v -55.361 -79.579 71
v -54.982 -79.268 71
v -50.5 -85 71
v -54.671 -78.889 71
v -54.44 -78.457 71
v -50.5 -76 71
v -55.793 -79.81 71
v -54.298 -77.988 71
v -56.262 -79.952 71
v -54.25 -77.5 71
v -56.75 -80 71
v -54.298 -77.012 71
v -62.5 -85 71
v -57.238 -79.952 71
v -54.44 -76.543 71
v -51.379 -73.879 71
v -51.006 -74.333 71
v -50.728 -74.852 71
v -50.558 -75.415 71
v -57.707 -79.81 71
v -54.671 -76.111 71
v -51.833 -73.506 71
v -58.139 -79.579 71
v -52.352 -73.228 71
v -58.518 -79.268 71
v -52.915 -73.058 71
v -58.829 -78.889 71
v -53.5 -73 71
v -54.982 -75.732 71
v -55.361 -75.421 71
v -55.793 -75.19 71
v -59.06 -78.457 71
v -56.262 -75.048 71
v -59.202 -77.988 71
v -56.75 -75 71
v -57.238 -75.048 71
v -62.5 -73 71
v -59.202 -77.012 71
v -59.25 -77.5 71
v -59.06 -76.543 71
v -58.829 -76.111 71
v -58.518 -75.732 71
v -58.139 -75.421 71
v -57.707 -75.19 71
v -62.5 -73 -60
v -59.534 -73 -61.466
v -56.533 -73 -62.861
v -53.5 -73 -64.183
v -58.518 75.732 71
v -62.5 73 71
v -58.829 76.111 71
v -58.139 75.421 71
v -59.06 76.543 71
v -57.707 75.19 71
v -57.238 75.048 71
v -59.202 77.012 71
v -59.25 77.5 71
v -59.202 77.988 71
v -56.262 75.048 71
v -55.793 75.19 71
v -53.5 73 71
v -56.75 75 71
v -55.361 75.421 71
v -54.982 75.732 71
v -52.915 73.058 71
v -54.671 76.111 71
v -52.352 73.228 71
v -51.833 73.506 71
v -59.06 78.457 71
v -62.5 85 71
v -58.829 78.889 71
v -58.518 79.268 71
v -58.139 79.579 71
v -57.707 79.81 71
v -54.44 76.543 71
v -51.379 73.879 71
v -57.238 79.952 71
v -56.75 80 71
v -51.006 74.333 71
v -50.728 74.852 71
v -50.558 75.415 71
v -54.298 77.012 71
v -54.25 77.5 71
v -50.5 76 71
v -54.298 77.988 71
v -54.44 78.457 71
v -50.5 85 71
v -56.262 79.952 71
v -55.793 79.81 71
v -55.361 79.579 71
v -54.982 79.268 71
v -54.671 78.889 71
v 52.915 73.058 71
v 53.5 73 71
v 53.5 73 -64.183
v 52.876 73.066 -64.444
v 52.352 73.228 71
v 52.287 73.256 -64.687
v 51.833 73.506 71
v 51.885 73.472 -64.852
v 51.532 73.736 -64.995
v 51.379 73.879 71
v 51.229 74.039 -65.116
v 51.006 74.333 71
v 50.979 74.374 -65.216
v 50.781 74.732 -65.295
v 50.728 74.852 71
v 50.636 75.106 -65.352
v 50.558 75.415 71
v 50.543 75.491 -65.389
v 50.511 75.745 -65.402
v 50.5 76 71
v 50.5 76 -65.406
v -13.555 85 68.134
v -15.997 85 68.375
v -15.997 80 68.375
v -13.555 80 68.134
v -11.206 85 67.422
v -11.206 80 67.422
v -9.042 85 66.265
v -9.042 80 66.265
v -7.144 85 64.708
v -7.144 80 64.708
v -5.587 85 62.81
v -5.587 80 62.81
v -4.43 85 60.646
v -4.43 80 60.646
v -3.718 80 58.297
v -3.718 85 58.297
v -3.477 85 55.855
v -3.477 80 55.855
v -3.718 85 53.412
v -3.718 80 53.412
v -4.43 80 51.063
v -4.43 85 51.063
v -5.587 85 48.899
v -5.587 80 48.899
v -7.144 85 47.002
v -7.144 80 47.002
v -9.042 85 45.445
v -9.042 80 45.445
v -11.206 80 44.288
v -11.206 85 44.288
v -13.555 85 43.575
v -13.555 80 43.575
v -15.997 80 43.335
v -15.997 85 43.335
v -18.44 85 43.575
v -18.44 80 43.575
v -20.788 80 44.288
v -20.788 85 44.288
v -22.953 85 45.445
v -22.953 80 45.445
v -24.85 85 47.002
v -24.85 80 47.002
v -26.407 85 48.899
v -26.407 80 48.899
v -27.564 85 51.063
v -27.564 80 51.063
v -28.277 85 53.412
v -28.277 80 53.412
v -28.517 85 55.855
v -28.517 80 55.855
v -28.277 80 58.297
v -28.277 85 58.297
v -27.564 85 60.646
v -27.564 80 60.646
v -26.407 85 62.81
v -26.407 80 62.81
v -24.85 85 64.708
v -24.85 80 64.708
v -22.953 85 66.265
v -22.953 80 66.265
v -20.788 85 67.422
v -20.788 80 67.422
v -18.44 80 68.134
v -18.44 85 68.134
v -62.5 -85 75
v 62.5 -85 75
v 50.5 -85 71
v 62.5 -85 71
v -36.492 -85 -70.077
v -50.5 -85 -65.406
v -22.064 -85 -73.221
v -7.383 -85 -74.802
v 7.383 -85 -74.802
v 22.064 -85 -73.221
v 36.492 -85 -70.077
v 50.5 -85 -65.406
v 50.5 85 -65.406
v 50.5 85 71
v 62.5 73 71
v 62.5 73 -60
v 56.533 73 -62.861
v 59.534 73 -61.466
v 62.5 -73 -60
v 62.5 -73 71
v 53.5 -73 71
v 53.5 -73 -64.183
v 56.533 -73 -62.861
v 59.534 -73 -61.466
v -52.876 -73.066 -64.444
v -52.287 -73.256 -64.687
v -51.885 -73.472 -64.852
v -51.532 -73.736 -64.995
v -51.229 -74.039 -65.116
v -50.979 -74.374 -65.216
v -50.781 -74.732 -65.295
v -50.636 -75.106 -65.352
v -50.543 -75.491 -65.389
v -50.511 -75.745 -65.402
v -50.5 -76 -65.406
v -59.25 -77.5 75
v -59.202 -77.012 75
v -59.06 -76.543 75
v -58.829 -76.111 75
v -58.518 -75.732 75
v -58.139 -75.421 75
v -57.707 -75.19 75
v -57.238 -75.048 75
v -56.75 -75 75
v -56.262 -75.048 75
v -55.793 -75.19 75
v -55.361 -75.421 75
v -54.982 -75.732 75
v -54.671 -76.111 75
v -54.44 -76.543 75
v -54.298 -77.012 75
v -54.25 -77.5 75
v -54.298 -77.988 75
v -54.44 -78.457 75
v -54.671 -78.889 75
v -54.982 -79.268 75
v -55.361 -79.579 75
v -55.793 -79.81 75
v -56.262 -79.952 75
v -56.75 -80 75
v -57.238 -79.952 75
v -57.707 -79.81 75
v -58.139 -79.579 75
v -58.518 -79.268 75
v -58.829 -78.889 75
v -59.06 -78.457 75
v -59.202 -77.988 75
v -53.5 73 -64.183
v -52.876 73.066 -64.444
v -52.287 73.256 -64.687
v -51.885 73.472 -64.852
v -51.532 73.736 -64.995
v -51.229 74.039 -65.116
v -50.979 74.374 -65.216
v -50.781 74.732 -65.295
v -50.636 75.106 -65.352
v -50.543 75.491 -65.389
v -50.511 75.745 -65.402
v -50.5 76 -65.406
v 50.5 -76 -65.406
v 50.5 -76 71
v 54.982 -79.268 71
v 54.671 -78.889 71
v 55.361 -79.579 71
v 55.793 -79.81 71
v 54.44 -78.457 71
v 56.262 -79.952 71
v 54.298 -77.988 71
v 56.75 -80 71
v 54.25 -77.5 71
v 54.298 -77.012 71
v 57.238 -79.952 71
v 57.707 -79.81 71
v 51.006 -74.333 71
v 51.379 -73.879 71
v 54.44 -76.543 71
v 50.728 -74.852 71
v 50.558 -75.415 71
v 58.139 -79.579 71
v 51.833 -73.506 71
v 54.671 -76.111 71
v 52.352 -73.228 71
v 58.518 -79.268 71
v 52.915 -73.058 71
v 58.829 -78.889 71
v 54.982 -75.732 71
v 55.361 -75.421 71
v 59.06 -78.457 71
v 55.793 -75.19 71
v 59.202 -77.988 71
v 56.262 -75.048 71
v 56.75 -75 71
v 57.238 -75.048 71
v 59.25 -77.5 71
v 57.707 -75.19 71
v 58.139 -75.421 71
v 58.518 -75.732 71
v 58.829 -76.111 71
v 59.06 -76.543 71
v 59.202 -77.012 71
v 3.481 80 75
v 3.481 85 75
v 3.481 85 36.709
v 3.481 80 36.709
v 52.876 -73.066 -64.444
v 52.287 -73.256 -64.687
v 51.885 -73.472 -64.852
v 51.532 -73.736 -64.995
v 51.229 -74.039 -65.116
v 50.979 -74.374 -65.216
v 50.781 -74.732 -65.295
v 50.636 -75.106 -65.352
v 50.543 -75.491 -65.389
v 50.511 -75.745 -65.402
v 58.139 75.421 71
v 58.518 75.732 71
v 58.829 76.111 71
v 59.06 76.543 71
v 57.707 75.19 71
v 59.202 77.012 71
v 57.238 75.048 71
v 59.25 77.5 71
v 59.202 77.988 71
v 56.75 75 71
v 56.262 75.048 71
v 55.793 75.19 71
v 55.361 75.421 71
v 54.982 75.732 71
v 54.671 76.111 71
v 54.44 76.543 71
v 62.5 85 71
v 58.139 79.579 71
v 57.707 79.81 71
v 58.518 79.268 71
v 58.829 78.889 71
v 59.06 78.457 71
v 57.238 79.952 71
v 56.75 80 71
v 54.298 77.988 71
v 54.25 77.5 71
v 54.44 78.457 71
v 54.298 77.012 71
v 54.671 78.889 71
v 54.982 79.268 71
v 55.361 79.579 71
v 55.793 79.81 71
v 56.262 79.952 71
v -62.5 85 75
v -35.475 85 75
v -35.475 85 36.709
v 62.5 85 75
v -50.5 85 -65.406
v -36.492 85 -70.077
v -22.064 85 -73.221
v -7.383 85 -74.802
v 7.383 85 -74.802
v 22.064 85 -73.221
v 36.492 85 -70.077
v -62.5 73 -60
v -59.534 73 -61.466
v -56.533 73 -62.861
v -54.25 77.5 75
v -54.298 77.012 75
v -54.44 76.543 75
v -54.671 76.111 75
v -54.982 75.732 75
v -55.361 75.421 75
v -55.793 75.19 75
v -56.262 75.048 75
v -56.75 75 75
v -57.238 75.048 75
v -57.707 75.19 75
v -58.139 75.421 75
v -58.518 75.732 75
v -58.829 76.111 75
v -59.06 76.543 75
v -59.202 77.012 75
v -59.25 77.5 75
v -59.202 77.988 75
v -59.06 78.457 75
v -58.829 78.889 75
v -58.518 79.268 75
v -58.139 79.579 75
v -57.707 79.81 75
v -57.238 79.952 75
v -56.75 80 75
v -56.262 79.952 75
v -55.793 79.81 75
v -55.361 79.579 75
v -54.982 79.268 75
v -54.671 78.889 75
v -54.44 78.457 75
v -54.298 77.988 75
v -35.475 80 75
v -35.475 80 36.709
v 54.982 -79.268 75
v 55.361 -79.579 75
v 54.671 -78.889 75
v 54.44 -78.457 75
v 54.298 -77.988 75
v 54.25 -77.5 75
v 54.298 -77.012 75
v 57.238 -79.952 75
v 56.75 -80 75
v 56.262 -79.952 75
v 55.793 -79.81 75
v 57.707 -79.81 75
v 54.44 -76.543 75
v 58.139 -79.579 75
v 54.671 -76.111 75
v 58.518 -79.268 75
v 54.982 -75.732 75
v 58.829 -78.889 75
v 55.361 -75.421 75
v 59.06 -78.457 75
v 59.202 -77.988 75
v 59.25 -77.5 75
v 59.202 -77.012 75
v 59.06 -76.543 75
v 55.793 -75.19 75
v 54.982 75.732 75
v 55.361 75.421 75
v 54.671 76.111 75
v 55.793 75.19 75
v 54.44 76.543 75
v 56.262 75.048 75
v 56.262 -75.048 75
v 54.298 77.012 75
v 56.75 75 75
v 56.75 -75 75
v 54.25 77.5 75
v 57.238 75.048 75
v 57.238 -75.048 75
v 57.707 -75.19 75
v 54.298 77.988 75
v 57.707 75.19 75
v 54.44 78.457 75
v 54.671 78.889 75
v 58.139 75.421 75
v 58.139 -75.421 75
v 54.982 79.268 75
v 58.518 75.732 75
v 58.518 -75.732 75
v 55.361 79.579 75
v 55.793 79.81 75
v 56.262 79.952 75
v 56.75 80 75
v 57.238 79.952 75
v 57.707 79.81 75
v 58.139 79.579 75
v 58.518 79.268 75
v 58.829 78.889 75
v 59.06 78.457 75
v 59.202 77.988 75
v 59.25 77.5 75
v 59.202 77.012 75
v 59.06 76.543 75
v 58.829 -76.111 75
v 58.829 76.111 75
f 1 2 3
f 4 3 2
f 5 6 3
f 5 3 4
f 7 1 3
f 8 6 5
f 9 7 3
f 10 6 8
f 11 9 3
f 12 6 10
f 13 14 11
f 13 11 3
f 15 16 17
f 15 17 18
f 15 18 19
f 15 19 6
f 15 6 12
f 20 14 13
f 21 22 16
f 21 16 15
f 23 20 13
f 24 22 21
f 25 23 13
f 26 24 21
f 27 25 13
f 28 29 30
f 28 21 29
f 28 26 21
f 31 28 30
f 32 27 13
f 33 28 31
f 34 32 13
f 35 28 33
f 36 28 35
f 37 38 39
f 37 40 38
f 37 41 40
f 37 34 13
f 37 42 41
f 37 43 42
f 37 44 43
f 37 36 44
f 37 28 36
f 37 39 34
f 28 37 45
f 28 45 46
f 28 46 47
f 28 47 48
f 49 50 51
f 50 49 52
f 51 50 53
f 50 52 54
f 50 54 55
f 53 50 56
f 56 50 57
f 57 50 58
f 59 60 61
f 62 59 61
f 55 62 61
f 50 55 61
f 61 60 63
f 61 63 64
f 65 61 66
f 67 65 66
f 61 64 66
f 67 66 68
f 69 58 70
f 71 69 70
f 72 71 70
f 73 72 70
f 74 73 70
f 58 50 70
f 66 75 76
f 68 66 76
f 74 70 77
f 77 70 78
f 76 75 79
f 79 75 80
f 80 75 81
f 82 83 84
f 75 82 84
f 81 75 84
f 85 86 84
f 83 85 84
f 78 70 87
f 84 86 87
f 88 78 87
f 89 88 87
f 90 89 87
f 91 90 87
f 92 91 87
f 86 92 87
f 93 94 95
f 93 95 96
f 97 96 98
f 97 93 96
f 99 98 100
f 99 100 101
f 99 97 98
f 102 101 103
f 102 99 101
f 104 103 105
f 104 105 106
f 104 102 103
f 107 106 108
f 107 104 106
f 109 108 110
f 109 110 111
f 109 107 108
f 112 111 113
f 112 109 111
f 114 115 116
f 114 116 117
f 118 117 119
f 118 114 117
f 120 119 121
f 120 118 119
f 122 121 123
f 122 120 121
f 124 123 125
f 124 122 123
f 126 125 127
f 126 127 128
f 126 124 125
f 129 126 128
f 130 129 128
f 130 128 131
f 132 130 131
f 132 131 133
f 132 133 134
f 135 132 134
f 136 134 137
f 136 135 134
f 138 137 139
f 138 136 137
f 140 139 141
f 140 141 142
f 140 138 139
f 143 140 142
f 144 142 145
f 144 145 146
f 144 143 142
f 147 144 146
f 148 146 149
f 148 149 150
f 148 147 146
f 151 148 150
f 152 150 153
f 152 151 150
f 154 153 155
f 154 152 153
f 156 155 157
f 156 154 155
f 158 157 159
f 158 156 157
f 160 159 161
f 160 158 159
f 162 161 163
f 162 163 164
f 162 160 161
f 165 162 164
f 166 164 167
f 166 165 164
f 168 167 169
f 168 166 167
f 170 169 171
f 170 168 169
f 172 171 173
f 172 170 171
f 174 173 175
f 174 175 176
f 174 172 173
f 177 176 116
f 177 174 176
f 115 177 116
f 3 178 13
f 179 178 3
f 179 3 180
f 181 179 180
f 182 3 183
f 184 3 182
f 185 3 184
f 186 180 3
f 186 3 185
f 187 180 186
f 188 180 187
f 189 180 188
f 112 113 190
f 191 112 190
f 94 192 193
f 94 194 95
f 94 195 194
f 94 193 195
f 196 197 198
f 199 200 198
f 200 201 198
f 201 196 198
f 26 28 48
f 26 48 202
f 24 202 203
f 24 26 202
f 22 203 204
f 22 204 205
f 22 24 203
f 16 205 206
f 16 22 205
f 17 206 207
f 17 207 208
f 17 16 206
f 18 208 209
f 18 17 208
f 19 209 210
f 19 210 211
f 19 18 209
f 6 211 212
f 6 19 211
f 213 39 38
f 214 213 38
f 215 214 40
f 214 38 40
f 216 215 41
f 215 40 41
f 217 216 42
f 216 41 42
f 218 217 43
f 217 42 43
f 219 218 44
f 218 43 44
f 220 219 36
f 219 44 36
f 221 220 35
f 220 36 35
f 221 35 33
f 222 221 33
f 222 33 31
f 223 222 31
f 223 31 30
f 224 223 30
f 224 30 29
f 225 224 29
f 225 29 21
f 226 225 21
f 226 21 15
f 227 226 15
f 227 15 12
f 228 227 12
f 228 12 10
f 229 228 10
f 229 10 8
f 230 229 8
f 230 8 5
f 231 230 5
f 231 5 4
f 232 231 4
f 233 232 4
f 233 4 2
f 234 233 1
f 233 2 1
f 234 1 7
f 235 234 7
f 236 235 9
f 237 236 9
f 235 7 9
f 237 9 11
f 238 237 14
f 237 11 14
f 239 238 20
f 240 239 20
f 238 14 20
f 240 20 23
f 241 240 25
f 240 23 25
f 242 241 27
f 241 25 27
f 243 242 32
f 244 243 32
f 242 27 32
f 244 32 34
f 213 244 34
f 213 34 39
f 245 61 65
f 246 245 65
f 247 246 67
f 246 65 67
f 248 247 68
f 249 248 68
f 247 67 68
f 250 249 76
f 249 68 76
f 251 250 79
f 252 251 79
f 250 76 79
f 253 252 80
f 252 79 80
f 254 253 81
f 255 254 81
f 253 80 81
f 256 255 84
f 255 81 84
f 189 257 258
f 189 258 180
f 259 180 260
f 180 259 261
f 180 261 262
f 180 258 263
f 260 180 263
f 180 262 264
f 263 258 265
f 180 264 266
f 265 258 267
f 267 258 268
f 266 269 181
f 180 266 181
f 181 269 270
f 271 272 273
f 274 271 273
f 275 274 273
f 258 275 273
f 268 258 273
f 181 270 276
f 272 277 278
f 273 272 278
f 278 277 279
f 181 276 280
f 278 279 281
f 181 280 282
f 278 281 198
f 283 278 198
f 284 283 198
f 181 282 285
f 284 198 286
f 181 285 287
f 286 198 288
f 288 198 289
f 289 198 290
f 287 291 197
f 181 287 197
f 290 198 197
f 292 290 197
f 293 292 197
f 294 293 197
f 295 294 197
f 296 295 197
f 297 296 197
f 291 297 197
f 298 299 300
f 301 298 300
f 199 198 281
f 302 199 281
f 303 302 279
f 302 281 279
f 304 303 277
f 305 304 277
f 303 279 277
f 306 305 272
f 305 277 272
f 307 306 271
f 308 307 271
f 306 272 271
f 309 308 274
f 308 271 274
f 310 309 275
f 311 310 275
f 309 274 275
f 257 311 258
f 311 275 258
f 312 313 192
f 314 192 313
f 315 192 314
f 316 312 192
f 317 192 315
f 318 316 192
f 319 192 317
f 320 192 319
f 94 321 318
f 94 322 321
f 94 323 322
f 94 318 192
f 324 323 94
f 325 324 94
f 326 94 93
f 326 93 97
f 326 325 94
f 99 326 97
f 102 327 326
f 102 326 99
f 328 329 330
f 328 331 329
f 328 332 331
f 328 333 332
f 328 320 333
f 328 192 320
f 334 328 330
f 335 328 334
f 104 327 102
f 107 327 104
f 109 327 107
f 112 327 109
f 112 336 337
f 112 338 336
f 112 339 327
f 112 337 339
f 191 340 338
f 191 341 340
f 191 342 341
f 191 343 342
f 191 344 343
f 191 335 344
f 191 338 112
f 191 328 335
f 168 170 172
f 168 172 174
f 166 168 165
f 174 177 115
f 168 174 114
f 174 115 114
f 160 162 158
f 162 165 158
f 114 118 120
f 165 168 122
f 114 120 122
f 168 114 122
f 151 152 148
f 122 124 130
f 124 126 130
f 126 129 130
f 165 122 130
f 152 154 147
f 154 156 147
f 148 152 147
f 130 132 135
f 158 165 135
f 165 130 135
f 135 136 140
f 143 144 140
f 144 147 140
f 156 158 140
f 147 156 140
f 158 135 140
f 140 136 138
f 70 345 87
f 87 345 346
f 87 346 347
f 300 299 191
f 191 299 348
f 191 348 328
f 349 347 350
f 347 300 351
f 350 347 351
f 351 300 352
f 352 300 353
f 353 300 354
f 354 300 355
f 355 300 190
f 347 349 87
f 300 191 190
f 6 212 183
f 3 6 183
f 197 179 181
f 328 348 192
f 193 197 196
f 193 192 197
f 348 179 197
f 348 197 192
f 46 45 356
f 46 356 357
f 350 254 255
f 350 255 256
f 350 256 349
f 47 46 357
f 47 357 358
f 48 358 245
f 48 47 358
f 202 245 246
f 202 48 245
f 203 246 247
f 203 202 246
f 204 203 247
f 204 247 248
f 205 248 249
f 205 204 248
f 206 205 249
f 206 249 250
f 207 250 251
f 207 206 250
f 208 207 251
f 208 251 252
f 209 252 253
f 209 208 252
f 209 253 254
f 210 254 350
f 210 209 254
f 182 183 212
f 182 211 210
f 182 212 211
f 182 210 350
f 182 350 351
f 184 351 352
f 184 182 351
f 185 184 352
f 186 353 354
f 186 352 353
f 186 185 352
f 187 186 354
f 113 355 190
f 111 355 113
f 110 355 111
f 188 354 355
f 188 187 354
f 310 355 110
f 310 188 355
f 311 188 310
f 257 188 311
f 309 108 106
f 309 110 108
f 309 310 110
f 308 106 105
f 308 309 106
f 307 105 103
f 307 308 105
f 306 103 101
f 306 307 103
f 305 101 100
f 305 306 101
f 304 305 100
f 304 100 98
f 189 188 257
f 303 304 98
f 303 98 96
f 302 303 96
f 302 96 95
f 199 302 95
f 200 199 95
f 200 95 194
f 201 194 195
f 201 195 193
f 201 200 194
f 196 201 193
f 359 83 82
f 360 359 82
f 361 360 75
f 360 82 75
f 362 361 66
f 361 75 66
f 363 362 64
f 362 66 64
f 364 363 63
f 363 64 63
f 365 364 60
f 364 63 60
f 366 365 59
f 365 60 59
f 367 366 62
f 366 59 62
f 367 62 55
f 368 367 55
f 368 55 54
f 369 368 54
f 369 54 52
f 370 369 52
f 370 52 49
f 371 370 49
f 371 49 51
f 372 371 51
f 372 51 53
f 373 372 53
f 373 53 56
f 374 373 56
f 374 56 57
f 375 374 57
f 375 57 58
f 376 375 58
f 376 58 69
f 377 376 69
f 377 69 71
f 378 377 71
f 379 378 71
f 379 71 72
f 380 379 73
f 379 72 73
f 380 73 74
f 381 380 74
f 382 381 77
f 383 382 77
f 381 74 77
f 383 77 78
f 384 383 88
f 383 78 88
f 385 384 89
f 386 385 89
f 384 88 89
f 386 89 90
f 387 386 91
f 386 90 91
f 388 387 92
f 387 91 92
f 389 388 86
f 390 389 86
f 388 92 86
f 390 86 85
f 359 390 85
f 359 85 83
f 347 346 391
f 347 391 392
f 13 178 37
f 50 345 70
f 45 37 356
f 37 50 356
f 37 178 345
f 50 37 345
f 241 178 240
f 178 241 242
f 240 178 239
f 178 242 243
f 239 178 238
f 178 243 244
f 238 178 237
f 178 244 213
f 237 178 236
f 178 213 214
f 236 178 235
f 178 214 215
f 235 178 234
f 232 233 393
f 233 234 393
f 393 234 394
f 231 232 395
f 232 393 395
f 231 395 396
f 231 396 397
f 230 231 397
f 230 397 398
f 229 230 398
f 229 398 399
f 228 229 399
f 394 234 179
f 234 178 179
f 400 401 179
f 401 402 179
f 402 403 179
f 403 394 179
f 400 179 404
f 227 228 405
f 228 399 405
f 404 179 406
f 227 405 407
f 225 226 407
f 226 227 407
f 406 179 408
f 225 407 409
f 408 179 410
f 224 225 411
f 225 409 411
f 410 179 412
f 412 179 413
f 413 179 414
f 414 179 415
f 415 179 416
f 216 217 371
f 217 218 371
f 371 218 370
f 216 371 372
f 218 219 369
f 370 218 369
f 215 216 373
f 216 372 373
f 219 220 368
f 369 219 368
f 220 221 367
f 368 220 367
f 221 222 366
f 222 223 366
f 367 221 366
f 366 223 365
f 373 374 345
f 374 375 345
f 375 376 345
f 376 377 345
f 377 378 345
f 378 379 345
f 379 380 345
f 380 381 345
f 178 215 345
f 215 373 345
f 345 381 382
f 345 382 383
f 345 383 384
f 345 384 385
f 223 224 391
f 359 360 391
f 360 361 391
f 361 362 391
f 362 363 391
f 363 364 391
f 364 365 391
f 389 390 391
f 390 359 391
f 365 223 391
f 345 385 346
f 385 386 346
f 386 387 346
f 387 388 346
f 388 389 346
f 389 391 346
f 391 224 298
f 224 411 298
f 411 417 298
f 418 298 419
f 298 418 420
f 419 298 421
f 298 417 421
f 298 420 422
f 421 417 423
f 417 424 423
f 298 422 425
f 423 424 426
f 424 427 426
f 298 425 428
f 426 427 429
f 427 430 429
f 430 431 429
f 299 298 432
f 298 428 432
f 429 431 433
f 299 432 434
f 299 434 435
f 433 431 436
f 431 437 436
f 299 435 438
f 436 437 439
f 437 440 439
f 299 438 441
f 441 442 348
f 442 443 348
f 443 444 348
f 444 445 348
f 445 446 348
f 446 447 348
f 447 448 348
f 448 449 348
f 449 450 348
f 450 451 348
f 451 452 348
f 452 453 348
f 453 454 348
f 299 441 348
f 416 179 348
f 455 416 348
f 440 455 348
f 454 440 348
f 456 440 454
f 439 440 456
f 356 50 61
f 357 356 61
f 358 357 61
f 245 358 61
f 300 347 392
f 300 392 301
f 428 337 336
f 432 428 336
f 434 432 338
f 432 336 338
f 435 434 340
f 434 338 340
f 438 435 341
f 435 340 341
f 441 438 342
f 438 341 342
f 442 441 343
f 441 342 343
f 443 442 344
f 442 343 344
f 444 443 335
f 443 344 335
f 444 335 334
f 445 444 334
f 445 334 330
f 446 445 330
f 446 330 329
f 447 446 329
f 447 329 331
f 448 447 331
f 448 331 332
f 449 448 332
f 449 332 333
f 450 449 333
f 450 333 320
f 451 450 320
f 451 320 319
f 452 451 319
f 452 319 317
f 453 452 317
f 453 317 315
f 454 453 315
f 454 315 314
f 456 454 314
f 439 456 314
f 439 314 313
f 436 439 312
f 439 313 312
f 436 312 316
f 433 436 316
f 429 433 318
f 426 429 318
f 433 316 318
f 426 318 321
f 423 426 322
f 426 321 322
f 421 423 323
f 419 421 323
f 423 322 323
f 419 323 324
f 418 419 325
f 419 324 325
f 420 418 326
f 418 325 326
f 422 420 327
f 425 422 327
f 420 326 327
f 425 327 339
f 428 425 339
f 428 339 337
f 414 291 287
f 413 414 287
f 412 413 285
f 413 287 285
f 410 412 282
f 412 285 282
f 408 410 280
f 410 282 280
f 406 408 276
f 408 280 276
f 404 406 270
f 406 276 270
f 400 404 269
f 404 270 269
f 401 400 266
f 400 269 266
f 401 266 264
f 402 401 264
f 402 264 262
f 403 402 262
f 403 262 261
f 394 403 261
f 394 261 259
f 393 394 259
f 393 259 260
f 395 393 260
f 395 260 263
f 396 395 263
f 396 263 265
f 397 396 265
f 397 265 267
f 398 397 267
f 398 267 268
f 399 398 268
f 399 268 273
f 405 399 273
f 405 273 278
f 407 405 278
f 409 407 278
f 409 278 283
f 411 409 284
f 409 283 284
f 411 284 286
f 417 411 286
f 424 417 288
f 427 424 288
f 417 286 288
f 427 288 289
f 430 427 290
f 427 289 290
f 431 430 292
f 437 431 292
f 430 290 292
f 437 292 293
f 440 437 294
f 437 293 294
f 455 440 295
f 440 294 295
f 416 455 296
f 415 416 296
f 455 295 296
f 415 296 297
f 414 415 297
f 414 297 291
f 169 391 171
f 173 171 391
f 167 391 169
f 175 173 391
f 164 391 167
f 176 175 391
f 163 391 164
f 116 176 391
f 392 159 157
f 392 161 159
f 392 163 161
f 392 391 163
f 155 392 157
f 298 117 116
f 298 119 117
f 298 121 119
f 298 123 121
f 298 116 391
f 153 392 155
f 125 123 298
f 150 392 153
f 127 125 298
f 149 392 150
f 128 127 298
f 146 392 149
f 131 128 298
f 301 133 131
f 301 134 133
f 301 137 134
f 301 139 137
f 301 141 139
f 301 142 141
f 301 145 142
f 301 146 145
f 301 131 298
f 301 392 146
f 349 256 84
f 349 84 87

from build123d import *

# Parameters (mm, degrees)
SKETCH1_W               = 150
SKETCH1_H               = 170
BOSS_EXTRUDE1_DEPTH     = 62.5
CUT_EXTRUDE1_DEPTH      = 197.038899201
CUT_EXTRUDE1_DEPTH_BACK = 197.038899201
CUT_EXTRUDE2_START      = -4
CUT_EXTRUDE2_DEPTH      = 180.388249351
SKETCH4_R               = 2.5
CUT_EXTRUDE3_DEPTH      = 181.131202346
SKETCH7_W               = 38.956320025
SKETCH7_H               = 38.29066934
SKETCH7_R               = 12.51992823
CUT_EXTRUDE4_DEPTH      = 5


with BuildPart() as part:
    # Sketch1 → Boss-Extrude1 (new, symmetric)
    with BuildSketch(Plane(origin=(0, 0, 0), x_dir=(0, 0, -1), z_dir=(1, 0, 0))):
        Rectangle(SKETCH1_W, SKETCH1_H)
    extrude(amount=BOSS_EXTRUDE1_DEPTH, both=True)

    # Sketch2 → Cut-Extrude1 (cut, two sides: drawn at the far end of the back side and taken through both)
    with BuildSketch(Plane(origin=(0, 85, 0), x_dir=(1, 0, 0), z_dir=(0, 1, 0)).offset(-CUT_EXTRUDE1_DEPTH_BACK)):
        with BuildLine():
            Line((-399.296963127, -111.543444717), (-62.5, 60))
            ThreePointArc((-62.5, 60), (0, 75), (62.5, 60))
            Line((62.5, 60), (399.296963127, -111.543444717))
            Line((399.296963127, -111.543444717), (399.296963127, 644.391335002))
            Line((399.296963127, 644.391335002), (-399.296963127, 644.391335002))
            Line((-399.296963127, 644.391335002), (-399.296963127, -111.543444717))
        make_face()
    extrude(amount=CUT_EXTRUDE1_DEPTH + CUT_EXTRUDE1_DEPTH_BACK, mode=Mode.SUBTRACT)

    # Sketch3 → Cut-Extrude2 (cut, through all)
    with BuildSketch(Plane.XY.offset(75).offset(CUT_EXTRUDE2_START)):
        with BuildLine():
            Line((50.5, 125.138194242), (106.621589134, 125.138194242))
            Line((106.621589134, 125.138194242), (106.621589134, 73))
            Line((106.621589134, 73), (53.5, 73))
            ThreePointArc((53.5, 73), (51.378679656, 73.878679656), (50.5, 76))
            Line((50.5, 76), (50.5, 125.138194242))
        make_face()
        with BuildLine():
            Line((-106.621589134, 125.138194242), (-106.621589134, 73))
            Line((-106.621589134, 73), (-53.5, 73))
            ThreePointArc((-53.5, 73), (-51.378679656, 73.878679656), (-50.5, 76))
            Line((-50.5, 76), (-50.5, 125.138194242))
            Line((-50.5, 125.138194242), (-106.621589134, 125.138194242))
        make_face()
        with BuildLine():
            Line((-50.5, -125.138194242), (-106.621589134, -125.138194242))
            Line((-106.621589134, -125.138194242), (-106.621589134, -73))
            Line((-106.621589134, -73), (-53.5, -73))
            ThreePointArc((-53.5, -73), (-51.378679656, -73.878679656), (-50.5, -76))
            Line((-50.5, -76), (-50.5, -125.138194242))
        make_face()
        with BuildLine():
            Line((106.621589134, -125.138194242), (106.621589134, -73))
            Line((106.621589134, -73), (53.5, -73))
            ThreePointArc((53.5, -73), (51.378679656, -73.878679656), (50.5, -76))
            Line((50.5, -76), (50.5, -125.138194242))
            Line((50.5, -125.138194242), (106.621589134, -125.138194242))
        make_face()
    extrude(amount=-CUT_EXTRUDE2_DEPTH, mode=Mode.SUBTRACT)

    # Sketch4 → Cut-Extrude3 (cut, through all)
    with BuildSketch(Plane(origin=(0, 0, 71), x_dir=(-1, 0, 0), z_dir=(0, 0, -1))):
        with Locations((-56.75, 77.5)):
            Circle(SKETCH4_R)
        with Locations(Location((56.75, 77.5, 0), (0, 0, 180))):
            Circle(SKETCH4_R)
        with Locations((56.75, -77.5)):
            Circle(SKETCH4_R)
        with Locations(Location((-56.75, -77.5, 0), (0, 0, 180))):
            Circle(SKETCH4_R)
    extrude(amount=-CUT_EXTRUDE3_DEPTH, mode=Mode.SUBTRACT)

    # Sketch7 → Cut-Extrude4 (cut)
    with BuildSketch(Plane(origin=(0, 85, 0), x_dir=(1, 0, 0), z_dir=(0, 1, 0))):
        with Locations((-15.997309365, -55.85466533)):
            Rectangle(SKETCH7_W, SKETCH7_H)
        with Locations(Location((-15.997309365, -55.85466533, 0), (0, 0, 270))):
            Circle(SKETCH7_R, mode=Mode.SUBTRACT)
    extrude(amount=-CUT_EXTRUDE4_DEPTH, mode=Mode.SUBTRACT)


solid = part.part
